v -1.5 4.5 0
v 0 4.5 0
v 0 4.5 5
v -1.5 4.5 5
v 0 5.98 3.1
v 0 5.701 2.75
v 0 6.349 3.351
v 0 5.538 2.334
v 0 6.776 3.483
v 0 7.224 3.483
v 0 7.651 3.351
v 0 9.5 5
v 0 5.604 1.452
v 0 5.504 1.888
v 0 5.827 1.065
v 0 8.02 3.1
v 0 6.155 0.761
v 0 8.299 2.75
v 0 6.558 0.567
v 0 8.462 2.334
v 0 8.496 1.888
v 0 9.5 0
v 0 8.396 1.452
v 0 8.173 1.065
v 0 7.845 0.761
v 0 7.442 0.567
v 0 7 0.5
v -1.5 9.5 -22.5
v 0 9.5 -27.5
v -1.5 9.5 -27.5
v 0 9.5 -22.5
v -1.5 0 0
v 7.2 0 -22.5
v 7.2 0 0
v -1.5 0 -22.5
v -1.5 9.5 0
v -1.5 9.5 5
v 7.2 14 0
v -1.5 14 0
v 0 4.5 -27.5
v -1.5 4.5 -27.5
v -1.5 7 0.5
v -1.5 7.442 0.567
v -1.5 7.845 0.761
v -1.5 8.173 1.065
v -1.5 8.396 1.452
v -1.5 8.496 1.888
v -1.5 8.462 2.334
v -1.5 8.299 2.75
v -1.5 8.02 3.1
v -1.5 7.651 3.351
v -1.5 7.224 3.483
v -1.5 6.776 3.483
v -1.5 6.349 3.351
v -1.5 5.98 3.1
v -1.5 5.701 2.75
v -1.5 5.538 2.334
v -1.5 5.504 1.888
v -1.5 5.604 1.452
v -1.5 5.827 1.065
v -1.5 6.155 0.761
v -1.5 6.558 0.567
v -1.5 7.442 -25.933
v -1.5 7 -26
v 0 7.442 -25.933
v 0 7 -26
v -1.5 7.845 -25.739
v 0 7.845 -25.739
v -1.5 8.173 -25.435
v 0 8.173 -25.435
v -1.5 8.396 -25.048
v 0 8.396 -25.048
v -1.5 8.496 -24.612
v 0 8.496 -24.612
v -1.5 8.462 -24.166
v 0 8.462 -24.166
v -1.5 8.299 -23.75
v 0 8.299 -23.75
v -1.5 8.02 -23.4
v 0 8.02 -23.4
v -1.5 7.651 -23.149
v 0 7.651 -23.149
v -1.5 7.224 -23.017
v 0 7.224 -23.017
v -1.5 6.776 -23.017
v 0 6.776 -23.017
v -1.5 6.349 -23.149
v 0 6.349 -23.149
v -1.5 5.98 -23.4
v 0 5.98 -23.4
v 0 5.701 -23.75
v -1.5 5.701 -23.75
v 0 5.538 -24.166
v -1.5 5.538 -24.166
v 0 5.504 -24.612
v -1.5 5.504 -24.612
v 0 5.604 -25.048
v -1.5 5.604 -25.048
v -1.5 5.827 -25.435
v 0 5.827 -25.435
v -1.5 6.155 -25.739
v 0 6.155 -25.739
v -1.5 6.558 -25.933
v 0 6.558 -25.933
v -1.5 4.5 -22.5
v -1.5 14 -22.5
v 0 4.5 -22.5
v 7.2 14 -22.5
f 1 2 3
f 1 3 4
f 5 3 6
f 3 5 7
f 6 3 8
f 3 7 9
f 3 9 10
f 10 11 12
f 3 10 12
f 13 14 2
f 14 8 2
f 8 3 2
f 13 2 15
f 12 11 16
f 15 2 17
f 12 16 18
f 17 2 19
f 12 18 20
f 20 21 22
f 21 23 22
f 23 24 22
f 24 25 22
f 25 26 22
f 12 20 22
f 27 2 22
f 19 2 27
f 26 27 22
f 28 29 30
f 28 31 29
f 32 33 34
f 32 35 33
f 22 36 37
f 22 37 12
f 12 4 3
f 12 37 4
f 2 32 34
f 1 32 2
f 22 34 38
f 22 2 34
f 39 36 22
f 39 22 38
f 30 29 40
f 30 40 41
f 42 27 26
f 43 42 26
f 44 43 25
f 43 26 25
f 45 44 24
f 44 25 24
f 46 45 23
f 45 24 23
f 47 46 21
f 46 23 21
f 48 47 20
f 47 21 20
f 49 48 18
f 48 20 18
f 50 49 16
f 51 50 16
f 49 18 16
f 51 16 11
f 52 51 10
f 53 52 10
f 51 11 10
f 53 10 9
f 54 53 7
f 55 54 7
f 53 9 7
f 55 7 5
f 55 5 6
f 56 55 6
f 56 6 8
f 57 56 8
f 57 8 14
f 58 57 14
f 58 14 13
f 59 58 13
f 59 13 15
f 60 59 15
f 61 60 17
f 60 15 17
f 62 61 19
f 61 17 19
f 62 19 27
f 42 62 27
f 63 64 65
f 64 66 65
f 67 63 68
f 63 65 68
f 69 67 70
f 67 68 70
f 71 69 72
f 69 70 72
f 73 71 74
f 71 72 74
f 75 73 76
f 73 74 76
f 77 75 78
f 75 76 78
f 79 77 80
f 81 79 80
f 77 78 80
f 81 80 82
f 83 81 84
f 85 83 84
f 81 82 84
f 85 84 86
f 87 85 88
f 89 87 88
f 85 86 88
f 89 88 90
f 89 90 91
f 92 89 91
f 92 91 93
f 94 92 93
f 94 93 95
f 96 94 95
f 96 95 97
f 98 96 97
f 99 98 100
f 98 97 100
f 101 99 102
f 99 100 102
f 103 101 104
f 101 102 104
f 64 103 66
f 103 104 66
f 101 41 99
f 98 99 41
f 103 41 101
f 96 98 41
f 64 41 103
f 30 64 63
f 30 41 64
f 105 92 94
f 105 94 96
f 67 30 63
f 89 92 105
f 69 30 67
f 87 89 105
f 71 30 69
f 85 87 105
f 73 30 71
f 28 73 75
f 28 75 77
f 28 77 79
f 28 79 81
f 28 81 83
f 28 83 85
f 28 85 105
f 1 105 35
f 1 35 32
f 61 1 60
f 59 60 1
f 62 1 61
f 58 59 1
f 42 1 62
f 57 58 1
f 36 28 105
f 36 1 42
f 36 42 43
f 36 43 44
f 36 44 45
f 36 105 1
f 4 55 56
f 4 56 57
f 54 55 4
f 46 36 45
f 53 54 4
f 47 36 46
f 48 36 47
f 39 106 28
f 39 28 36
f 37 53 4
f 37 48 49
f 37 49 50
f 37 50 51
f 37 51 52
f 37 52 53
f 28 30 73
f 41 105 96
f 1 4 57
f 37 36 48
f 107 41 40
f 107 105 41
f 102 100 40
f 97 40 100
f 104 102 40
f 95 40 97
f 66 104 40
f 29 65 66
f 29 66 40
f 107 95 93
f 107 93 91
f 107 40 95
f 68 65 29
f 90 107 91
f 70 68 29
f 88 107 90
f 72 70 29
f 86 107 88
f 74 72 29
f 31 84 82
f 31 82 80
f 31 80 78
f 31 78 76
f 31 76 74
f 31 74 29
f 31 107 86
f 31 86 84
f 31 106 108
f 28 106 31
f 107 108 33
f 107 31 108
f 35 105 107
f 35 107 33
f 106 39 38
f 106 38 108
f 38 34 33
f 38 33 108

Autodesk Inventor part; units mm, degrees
ref_plane "YZ Plane" through (0, 0, 0) normal (1, 0, 0) x (0, 1, 0)
ref_plane "XZ Plane" through (0, 0, 0) normal (0, 1, 0) x (-1, 0, 0)
ref_plane "XY Plane" through (0, 0, 0) normal (0, 0, 1) x (1, 0, 0)
sketch "Sketch1" plane through (0, 0, 0) normal (1, 0, 0) x (0, 1, 0)
  line L0 (0, 0) -> (14, 0)
  line L1 (14, 0) -> (14, -22.5)
  line L2 (14, -22.5) -> (0, -22.5)
  line L3 (0, -22.5) -> (0, 0)
  dimension "d0" = 14
  dimension "d1" = 22.5
extrude "Extrusion1" add sketch "Sketch1" along normal blind 7.2
sketch "Sketch2" plane through (0, 0, 0) normal (-1, 0, 0) x (0, 0, 1)
  line L0 (-22.5, 0) -> (-22.5, 14) projected
  line L1 (0, 0) -> (-22.5, 0) projected
  line L2 (0, 14) -> (0, 0) projected
  line L3 (-22.5, 14) -> (0, 14) projected
extrude "Extrusion2" add sketch "Sketch2" along normal blind 1.5
sketch "Sketch3" plane through (7.2, 0, 0) normal (0, 0, 1) x (1, 0, 0)
  line L0 (-8.7, 0) -> (-8.7, 14) projected
  line L1 (-8.7, 14) -> (0, 14) projected
  line L2 (-8.7, 0) -> (-7.2, 0)
  line L3 (-7.2, 0) -> (-7.2, 14)
  line L4 (-7.2, 14) -> (-8.7, 14)
  line L5 (-8.7, 14) -> (-8.7, 0)
  line L6 (-8.7, 7) -> (-7.2, 7)
  line L7 (-8.7, 9.5) -> (-7.2, 9.5)
  line L8 (-7.2, 9.5) -> (-7.2, 4.5)
  line L9 (-7.2, 4.5) -> (-8.7, 4.5)
  line L10 (-8.7, 4.5) -> (-8.7, 9.5)
  line L11 (-8.7, 9.5) -> (-7.2, 4.5) construction
  line L12 (-7.2, 9.5) -> (-8.7, 4.5) construction
  point P0 (-7.95, 7)
  dimension "d6" = 5
extrude "Extrusion3" add sketch "Sketch3" along normal blind 5 contours L0 L6 L3 L9 | L0 L7 L3 L6
sketch "Sketch4" plane through (7.2, 0, -22.5) normal (0, 0, -1) x (-1, 0, 0)
  line L0 (8.7, 9.5) -> (8.7, 4.5) projected
  line L1 (8.7, 4.5) -> (7.2, 4.5) projected
  line L2 (7.2, 4.5) -> (7.2, 9.5) projected
  line L3 (7.2, 9.5) -> (8.7, 9.5) projected
  point P0 (7.2, 0)
extrude "Extrusion4" add sketch "Sketch4" along normal blind 5
sketch "Sketch5" plane through (0, 4.5, -22.5) normal (1, 0, 0) x (0, 0, -1)
  line L0 (-22.5, 5) -> (-27.5, 5) projected
  line L1 (-22.5, 0) -> (-27.5, 0) projected
  line L2 (-27.5, 0) -> (-27.5, 5) projected
  line L3 (0, -4.5) -> (0, 9.5) projected
  line L4 (-22.5, 9.5) -> (-22.5, -4.5) projected
  line L5 (0, 5) -> (5, 5) projected
  line L6 (0, 0) -> (5, 0) projected
  line L7 (-27.5, 2.5) -> (-22.5, 2.5)
  line L8 (0, 2.5) -> (5, 2.5)
  line L9 (-22.5, 2.5) -> (-23, 2.5)
  line L10 (0, 2.5) -> (0.5, 2.5)
  line L11 (-23, 2.5) -> (-24.5, 2.5)
  circle A0 centre (-24.5, 2.5) radius 1.5
  line L12 (0.5, 2.5) -> (2, 2.5)
  circle A1 centre (2, 2.5) radius 1.5
  dimension "d11" = 0.5
  dimension "d12" = 0.5
  dimension "d13" = 1.5
  dimension "d14" = 1.5
extrude "Extrusion5" cut sketch "Sketch5" against normal blind 5 contours A0 L7 | L7 A0 | A1 L8 | L8 A1
sketch "Sketch6" plane through (7.2, 0, 0) normal (1, 0, 0) x (0, 0, -1)
  line L0 (0, 14) -> (22.5, 14) projected
  line L1 (0, 14) -> (22.6011, 13.9799) construction
  line L2 (22.6011, 13.9799) -> (22.5897, 1.2087) construction
  line L3 (22.5897, 1.2087) -> (-0.0114, 1.2289) construction
  line L4 (-0.0114, 1.2289) -> (0, 14) construction
  point P0 (0, 0)
properties part number "Voltmeter"
